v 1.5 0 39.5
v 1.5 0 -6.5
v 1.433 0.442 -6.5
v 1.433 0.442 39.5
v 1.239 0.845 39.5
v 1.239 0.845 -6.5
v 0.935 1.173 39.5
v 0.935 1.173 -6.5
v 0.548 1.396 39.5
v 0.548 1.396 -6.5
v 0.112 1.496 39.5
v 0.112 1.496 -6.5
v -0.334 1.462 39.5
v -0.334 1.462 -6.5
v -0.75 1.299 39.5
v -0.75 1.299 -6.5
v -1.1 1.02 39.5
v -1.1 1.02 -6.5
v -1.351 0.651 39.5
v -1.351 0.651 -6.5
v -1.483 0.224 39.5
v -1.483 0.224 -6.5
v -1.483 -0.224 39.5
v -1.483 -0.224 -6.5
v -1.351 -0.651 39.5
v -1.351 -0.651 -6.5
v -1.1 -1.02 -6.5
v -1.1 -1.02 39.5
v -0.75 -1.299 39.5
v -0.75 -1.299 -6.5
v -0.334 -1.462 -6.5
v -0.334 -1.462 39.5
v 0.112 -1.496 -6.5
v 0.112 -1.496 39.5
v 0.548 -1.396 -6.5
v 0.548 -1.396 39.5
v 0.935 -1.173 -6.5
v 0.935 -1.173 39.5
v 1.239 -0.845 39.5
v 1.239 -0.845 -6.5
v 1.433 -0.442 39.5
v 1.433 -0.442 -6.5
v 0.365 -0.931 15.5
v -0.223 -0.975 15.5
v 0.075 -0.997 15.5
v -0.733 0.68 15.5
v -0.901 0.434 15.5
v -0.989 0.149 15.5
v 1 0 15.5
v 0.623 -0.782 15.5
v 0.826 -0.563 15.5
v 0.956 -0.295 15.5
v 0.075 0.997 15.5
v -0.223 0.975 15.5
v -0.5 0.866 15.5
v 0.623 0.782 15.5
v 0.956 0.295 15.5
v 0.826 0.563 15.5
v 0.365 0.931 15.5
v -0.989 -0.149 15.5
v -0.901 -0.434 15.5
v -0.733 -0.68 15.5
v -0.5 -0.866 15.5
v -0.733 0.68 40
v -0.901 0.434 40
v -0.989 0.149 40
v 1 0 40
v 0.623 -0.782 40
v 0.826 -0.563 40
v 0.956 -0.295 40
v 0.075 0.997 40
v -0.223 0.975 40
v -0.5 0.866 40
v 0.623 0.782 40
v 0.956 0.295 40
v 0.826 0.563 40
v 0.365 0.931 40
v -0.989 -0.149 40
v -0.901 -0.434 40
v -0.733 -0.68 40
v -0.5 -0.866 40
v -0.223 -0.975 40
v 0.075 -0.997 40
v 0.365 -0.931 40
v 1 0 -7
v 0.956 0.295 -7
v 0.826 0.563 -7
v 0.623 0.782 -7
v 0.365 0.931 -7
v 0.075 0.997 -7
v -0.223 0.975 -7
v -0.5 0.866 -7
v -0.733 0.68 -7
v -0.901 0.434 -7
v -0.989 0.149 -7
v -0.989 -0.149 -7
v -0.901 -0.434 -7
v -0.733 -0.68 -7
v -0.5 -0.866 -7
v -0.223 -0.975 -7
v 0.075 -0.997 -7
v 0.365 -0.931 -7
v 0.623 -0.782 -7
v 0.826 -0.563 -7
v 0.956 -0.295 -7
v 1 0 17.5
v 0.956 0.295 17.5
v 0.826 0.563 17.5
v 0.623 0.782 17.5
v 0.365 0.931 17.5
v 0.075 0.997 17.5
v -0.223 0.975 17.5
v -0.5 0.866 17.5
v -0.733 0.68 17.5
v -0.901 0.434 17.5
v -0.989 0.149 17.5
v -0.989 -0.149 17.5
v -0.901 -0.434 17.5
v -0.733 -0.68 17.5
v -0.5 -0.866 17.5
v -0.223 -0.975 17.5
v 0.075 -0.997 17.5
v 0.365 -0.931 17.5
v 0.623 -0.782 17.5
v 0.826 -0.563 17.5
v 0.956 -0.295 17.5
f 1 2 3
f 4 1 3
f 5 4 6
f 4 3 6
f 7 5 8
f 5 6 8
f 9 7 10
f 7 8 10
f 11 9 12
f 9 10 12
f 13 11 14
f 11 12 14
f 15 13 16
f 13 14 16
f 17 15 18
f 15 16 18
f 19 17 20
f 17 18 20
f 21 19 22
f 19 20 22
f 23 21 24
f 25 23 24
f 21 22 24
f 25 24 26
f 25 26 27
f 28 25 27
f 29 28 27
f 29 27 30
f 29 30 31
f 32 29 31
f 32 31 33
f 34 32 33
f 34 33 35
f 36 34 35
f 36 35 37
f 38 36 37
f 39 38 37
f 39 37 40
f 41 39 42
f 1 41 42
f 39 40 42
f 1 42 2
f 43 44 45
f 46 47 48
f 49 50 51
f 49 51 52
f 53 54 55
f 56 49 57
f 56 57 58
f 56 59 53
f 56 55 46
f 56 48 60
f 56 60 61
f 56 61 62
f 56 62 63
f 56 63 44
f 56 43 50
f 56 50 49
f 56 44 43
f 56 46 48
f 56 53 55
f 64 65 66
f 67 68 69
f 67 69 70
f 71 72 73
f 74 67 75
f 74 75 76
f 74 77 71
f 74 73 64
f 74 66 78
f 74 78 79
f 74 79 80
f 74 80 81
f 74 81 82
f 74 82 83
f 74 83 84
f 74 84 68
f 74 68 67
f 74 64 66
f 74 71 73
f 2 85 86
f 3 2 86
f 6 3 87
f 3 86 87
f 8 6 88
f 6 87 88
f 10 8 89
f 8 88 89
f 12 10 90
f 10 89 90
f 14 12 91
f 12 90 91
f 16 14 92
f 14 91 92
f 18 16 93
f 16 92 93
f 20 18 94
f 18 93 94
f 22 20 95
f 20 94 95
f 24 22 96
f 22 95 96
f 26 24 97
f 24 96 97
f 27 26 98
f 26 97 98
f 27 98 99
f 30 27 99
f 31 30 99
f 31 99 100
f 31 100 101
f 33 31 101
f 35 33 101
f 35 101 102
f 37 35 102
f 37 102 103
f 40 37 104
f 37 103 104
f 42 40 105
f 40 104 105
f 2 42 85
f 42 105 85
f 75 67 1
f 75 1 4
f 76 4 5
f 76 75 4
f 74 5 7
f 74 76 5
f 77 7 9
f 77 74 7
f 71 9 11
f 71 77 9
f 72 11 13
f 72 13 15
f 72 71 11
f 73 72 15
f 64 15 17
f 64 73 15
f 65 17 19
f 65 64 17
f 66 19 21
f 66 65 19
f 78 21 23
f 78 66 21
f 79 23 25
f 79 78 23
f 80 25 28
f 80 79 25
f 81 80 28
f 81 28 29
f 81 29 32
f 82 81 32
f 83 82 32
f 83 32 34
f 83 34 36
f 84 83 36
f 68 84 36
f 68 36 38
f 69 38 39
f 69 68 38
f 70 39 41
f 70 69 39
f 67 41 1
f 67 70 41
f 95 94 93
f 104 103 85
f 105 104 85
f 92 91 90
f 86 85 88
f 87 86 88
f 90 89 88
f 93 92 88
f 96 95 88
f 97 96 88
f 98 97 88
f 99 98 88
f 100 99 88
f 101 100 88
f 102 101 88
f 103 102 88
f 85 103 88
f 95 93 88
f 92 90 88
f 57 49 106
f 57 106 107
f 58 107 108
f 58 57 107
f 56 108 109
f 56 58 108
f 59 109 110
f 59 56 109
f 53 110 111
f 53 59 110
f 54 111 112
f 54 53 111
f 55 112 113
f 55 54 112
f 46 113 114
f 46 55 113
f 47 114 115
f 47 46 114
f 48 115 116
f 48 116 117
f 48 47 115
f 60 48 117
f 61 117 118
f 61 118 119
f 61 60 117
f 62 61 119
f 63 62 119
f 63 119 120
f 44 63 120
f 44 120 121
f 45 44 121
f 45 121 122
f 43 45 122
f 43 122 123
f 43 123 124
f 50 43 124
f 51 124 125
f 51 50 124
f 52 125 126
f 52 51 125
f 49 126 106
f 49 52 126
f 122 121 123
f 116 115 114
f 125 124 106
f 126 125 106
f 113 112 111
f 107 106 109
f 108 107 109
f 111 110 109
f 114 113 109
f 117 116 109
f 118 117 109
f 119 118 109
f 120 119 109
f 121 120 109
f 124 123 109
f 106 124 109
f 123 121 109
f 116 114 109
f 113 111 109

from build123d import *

# Parameters (mm, degrees)
BOSS_EXTRUDE1_DEPTH      = 40
BOSS_EXTRUDE1_DEPTH_BACK = 7
SKETCH1_R                = 1.5
CHAMFER1_SIZE            = 0.5
CUT_EXTRUDE1_DEPTH       = 1
CUT_EXTRUDE1_DEPTH_BACK  = 1
SKETCH2_R                = 1


with BuildPart() as part:
    # Sketch1 → Boss-Extrude1 (new, two sides: drawn at the far end of the back side and taken through both)
    with BuildSketch(Plane.XY.offset(-BOSS_EXTRUDE1_DEPTH_BACK)):
        Circle(SKETCH1_R)
    extrude(amount=BOSS_EXTRUDE1_DEPTH + BOSS_EXTRUDE1_DEPTH_BACK)

    # Chamfer1
    chamfer1_edges = [part.edges().sort_by_distance(p)[0] for p in [
        (-1.5, 0, 40),
        (-1.5, 0, -7),
    ]]
    chamfer(chamfer1_edges, length=CHAMFER1_SIZE)

    # Sketch2 → Cut-Extrude1 (cut, two sides: drawn at the far end of the back side and taken through both)
    with BuildSketch(Plane.XY.offset(16.5).offset(-CUT_EXTRUDE1_DEPTH_BACK)):
        Circle(SKETCH2_R)
    extrude(amount=CUT_EXTRUDE1_DEPTH + CUT_EXTRUDE1_DEPTH_BACK, mode=Mode.SUBTRACT)


solid = part.part
